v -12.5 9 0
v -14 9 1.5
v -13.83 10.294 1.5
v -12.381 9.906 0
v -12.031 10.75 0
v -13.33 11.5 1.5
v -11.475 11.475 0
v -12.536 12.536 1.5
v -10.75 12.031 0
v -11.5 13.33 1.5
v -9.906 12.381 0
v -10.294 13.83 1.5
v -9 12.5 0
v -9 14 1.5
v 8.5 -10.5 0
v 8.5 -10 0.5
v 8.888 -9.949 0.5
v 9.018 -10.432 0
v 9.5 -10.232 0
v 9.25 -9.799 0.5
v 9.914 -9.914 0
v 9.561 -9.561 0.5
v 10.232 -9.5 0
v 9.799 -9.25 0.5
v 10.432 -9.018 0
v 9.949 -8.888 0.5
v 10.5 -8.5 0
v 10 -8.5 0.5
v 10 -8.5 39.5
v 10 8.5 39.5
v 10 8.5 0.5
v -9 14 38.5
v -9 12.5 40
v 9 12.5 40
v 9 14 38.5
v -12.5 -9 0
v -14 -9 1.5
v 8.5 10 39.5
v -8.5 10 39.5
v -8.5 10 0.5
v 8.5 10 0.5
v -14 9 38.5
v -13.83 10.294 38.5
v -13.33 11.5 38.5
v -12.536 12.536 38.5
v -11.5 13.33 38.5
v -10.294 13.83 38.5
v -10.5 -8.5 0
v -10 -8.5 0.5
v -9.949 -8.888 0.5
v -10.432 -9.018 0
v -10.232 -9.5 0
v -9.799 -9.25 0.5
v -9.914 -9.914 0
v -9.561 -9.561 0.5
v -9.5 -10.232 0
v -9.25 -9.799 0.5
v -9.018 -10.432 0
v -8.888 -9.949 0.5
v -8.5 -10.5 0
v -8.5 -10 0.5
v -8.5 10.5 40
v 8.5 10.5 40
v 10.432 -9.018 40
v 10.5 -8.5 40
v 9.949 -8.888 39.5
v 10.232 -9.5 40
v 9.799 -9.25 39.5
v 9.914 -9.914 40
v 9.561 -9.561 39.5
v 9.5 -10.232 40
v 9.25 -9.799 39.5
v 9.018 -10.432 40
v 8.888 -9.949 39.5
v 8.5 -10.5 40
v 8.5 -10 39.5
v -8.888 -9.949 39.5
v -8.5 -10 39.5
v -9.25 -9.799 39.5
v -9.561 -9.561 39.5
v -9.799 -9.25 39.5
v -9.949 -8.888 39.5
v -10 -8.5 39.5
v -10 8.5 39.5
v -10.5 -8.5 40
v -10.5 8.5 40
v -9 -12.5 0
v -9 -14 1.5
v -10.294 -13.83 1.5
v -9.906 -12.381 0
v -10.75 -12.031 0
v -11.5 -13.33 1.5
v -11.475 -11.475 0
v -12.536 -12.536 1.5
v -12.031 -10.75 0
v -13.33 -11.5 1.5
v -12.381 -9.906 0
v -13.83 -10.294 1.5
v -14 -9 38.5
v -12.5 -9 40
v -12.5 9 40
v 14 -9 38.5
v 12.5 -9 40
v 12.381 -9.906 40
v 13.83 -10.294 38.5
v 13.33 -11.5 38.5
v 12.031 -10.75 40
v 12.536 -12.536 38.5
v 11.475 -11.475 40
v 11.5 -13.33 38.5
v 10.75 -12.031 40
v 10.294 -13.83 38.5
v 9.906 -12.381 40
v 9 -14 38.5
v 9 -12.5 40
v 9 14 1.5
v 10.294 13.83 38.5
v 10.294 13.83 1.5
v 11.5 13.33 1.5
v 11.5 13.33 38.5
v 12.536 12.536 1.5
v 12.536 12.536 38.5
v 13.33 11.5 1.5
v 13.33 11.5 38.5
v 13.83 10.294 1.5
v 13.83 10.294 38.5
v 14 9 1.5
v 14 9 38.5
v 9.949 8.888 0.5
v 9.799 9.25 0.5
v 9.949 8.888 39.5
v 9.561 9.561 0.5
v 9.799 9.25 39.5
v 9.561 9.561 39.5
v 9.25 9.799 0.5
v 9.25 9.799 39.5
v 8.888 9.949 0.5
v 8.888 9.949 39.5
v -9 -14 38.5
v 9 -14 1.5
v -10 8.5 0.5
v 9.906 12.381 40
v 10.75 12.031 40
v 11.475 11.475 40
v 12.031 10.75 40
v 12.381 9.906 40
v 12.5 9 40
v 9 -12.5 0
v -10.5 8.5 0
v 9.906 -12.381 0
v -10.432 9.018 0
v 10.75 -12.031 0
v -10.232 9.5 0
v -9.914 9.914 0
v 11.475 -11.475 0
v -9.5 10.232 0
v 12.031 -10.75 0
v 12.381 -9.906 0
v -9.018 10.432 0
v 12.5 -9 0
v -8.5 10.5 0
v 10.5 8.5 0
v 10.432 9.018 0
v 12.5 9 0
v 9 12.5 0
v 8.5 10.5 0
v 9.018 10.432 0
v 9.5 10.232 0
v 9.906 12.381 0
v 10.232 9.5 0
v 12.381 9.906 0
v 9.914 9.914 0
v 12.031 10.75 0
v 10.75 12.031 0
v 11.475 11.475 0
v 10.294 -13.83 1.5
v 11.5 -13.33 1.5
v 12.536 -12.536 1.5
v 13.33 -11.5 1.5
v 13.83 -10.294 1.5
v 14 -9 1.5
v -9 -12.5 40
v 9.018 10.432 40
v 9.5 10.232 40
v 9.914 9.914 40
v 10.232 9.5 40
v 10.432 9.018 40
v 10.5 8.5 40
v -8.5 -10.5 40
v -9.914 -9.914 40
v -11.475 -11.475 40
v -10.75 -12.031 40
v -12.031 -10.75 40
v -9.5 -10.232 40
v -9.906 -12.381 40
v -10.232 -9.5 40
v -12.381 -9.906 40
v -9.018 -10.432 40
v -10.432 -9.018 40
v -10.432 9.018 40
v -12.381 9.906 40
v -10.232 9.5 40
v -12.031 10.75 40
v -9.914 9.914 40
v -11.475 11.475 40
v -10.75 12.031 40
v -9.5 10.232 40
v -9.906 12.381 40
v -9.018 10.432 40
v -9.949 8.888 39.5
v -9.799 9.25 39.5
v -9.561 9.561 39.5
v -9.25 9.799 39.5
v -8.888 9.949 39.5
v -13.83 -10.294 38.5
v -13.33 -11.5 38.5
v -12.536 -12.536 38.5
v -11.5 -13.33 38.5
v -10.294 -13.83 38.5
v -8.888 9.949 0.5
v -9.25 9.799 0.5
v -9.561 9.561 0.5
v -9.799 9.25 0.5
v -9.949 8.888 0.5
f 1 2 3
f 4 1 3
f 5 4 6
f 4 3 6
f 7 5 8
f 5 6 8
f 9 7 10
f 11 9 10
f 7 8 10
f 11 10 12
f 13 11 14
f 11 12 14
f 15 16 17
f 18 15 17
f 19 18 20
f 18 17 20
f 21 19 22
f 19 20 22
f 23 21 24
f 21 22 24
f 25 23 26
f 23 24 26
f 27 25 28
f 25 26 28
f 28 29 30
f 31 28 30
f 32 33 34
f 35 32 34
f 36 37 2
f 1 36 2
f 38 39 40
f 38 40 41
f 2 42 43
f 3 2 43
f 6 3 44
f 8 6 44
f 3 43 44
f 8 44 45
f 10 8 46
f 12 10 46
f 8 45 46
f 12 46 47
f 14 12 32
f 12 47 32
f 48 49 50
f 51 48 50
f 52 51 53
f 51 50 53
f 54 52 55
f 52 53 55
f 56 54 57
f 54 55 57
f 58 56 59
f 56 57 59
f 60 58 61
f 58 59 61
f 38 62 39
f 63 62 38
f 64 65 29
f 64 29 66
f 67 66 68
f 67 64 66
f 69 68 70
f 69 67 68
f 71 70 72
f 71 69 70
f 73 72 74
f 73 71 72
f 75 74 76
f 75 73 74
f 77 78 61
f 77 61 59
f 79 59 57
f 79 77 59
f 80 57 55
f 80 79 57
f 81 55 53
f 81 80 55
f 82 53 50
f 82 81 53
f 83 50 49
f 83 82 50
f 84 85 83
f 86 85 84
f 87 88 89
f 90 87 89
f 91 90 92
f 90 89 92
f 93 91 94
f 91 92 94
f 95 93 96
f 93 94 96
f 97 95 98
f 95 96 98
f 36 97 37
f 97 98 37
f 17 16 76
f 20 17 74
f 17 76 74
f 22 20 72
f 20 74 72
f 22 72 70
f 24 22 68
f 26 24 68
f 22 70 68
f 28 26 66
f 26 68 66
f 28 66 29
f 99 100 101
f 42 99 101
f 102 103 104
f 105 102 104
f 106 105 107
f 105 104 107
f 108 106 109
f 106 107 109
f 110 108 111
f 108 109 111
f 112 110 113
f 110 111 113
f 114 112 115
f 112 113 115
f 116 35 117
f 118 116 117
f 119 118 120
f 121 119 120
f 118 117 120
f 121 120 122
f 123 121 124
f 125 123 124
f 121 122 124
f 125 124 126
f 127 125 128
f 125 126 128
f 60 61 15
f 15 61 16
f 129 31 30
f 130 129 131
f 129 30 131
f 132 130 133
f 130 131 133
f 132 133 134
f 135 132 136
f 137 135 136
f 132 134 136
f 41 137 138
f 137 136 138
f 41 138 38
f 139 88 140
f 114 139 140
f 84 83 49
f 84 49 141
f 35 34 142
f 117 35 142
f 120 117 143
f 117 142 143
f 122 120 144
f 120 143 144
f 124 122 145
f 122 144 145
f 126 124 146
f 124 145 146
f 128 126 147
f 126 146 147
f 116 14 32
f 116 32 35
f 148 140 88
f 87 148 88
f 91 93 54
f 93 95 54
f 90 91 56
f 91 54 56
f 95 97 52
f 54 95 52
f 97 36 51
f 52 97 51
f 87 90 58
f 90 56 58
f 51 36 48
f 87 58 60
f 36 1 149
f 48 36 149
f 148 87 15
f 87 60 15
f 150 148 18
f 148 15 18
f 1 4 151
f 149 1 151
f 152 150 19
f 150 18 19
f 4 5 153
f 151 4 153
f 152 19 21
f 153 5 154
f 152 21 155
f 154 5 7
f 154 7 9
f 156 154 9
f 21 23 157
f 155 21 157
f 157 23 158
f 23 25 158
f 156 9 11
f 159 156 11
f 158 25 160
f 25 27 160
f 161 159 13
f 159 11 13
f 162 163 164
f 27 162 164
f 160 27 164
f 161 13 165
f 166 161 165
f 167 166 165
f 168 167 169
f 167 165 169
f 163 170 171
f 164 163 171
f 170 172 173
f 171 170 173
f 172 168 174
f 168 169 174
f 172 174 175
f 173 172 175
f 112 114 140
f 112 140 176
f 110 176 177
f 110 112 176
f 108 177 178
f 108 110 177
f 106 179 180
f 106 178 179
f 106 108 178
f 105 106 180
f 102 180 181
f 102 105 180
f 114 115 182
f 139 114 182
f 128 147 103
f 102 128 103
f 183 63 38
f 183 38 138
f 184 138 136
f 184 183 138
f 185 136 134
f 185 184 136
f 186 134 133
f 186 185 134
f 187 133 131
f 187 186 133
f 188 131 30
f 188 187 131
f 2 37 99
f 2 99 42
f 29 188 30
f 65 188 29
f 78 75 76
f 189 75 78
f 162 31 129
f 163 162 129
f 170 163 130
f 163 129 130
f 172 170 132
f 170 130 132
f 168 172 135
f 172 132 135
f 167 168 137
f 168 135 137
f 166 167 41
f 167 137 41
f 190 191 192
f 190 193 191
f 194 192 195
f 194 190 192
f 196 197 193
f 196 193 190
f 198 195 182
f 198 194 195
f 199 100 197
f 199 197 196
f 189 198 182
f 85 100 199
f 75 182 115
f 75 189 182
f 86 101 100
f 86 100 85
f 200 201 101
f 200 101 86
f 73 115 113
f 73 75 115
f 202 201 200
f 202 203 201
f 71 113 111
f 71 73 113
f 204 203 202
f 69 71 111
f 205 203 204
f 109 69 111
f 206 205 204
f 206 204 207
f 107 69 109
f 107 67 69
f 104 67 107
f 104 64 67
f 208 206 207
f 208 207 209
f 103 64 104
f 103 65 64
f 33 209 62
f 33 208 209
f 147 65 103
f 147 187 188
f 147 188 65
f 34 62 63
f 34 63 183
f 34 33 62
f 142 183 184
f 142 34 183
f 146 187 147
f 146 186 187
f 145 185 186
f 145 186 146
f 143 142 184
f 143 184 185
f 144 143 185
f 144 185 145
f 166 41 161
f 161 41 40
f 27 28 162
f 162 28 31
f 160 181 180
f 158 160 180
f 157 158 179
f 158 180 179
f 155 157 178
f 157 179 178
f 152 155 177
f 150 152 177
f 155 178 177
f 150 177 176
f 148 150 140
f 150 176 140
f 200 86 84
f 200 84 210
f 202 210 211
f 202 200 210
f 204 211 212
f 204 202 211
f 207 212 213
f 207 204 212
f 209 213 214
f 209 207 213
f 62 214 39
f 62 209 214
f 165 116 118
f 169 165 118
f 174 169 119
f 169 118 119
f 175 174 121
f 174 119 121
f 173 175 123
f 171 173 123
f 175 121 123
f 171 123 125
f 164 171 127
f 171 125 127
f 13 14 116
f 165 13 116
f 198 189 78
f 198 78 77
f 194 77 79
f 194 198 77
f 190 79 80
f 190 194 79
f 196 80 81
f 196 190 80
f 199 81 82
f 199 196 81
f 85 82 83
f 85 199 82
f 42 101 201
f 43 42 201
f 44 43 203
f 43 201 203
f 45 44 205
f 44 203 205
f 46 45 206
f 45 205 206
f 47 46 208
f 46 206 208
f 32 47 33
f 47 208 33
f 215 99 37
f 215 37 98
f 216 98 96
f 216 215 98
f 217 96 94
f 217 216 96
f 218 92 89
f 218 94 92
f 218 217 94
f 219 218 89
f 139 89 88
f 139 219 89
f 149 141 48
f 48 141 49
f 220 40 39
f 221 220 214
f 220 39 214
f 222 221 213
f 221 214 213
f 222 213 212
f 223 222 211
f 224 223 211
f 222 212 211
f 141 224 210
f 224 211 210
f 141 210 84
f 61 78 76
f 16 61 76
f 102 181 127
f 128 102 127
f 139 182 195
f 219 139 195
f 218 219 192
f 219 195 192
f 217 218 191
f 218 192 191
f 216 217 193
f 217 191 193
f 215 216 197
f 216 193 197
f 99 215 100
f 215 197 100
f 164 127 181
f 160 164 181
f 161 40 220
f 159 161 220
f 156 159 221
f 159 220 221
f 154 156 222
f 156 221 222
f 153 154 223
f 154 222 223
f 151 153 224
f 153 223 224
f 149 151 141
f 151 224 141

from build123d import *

# Parameters (mm, degrees)
F0_W     = 28
F0_H     = 28
F0_W_2   = 20
F0_H_2   = 20
F1_DEPTH = 40
F2_R     = 1.5
F3_R     = 5
F4_SIZE  = 1.5
F5_SIZE  = 0.5


with BuildPart() as f1:
    # F0 (on Top) → F1 (new body)
    with BuildSketch(Plane.XY):
        Rectangle(F0_W, F0_H)
        Rectangle(F0_W_2, F0_H_2, mode=Mode.SUBTRACT)
    extrude(amount=F1_DEPTH)

    # F2
    f2_edges = [f1.edges().sort_by_distance(p)[0] for p in [
        (-10, 10, 20),
        (10, 10, 20),
        (10, -10, 20),
        (-10, -10, 20),
    ]]
    fillet(f2_edges, radius=F2_R)

    # F3
    f3_edges = [f1.edges().sort_by_distance(p)[0] for p in [
        (-14, 14, 20),
        (-14, -14, 20),
        (14, -14, 20),
        (14, 14, 20),
    ]]
    fillet(f3_edges, radius=F3_R)

    # F4
    f4_edges = [f1.edges().sort_by_distance(p)[0] for p in [
        (-14, 0, 40),
        (-14, 0, 0),
    ]]
    chamfer(f4_edges, length=F4_SIZE)

    # F5
    f5_edges = [f1.edges().sort_by_distance(p)[0] for p in [
        (-10, 0, 40),
        (0, -10, 0),
    ]]
    chamfer(f5_edges, length=F5_SIZE)


solid = f1.part
